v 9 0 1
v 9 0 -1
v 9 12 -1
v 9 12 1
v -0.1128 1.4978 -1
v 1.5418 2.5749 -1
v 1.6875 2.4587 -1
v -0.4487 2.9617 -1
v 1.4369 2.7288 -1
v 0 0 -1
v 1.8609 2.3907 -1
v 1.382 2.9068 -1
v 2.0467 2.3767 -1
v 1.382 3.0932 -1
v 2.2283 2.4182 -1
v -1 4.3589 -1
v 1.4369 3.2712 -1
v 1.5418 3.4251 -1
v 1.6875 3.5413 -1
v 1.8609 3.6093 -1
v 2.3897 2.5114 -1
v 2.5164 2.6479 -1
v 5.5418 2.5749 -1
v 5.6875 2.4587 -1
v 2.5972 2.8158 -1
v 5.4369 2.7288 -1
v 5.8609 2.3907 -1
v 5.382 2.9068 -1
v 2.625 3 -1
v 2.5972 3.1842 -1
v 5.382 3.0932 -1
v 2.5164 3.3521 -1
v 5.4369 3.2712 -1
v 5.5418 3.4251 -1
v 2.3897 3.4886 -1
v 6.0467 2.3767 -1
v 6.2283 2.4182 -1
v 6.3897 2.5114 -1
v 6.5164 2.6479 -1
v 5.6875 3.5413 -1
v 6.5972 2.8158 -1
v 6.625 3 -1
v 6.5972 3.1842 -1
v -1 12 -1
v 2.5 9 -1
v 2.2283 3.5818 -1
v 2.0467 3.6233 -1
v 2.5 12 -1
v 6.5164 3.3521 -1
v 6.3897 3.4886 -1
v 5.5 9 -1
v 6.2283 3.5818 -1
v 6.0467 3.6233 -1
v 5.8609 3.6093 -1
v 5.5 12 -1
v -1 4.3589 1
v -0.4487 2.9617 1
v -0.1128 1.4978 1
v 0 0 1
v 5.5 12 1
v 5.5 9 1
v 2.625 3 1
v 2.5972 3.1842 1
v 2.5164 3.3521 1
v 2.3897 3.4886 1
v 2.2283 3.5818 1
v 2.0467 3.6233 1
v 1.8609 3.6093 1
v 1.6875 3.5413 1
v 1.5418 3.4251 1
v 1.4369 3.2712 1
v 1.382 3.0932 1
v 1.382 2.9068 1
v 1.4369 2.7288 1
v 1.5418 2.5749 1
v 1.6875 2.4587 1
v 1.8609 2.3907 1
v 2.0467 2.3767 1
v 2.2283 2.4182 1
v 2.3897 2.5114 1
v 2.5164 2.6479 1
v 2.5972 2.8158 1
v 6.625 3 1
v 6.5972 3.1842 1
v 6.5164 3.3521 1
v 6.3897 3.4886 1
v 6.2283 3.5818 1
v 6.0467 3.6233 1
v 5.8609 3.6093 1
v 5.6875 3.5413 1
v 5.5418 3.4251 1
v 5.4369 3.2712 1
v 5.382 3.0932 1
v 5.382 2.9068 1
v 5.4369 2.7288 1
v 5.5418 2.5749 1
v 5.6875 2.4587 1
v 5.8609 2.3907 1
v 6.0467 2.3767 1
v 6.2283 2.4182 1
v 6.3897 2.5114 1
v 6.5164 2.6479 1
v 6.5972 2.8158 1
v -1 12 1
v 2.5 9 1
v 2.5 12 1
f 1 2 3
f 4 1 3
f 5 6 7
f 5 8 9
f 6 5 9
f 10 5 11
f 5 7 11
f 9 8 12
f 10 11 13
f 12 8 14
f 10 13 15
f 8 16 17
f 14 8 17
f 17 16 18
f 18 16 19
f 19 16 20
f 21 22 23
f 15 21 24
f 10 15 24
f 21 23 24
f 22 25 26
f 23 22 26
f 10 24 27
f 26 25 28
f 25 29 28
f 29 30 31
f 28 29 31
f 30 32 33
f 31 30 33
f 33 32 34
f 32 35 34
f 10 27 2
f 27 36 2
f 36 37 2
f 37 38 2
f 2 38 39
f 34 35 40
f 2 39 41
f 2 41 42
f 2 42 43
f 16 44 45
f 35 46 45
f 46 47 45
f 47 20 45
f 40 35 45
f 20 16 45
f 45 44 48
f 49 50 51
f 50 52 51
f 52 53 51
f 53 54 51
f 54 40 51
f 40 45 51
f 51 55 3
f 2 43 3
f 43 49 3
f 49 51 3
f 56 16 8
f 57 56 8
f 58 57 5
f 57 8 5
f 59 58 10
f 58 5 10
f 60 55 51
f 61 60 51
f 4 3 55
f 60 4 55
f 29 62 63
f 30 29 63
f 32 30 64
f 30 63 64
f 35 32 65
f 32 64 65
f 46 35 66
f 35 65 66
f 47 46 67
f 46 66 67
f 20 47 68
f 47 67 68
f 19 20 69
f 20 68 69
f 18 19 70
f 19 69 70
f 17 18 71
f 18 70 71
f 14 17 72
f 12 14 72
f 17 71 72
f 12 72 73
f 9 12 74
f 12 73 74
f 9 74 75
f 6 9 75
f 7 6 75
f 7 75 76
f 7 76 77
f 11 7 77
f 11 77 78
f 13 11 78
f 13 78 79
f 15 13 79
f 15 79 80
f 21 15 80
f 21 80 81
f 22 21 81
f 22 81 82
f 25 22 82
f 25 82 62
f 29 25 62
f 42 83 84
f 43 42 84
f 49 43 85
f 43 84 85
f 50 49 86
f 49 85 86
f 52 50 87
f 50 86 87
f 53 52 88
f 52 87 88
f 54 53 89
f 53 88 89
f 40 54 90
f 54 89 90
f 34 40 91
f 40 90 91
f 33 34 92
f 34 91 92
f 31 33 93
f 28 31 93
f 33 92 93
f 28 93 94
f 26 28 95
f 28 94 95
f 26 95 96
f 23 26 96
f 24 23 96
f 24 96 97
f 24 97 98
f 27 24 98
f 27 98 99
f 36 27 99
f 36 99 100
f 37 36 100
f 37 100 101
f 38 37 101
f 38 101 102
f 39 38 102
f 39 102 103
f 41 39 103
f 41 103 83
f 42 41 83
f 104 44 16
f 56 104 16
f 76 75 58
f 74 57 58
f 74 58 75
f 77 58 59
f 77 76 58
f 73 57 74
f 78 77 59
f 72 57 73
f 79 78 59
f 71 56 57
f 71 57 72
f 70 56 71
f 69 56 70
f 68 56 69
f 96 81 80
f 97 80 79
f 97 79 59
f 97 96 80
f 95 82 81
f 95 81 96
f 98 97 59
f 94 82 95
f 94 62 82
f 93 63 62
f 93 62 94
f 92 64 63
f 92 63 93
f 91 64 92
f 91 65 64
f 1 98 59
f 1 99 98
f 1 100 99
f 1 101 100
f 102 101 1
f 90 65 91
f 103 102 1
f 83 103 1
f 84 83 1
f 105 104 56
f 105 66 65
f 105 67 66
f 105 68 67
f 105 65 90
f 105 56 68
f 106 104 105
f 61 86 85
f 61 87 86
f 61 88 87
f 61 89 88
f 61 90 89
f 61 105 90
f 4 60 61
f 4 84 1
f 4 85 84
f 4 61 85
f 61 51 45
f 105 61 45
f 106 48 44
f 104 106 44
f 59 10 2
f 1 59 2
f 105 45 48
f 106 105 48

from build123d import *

# Parameters (mm, degrees)
BOSS_EXTRU_2_DEPTH      = 1
BOSS_EXTRU_2_DEPTH_BACK = 1
ESQUISSE3_R             = 0.625
ENL_V_MAT_EXTRU_1_DEPTH = 10


with BuildPart() as part:
    # Esquisse1 → Boss.-Extru.2 (new, two sides: drawn at the far end of the back side and taken through both)
    with BuildSketch(Plane.XY.offset(-BOSS_EXTRU_2_DEPTH_BACK)):
        with BuildLine():
            Line((0, 0), (9, 0))
            Line((9, 0), (9, 12))
            Line((9, 12), (5.5, 12))
            Line((5.5, 12), (5.5, 9))
            Line((5.5, 9), (2.5, 9))
            Line((2.5, 9), (2.5, 12))
            Line((2.5, 12), (-1, 12))
            Line((-1, 12), (-1, 4.358898944))
            ThreePointArc((-1, 4.358898944), (-0.253205655, 2.236067977), (0, 0))
        make_face()
    extrude(amount=BOSS_EXTRU_2_DEPTH + BOSS_EXTRU_2_DEPTH_BACK)

    # Esquisse3 → Enlèv. mat.-Extru.1 (cut)
    with BuildSketch(Plane.XY.offset(1)):
        with Locations((2, 3)):
            Circle(ESQUISSE3_R)
        with Locations((6, 3)):
            Circle(ESQUISSE3_R)
    extrude(amount=-ENL_V_MAT_EXTRU_1_DEPTH, mode=Mode.SUBTRACT)


solid = part.part
